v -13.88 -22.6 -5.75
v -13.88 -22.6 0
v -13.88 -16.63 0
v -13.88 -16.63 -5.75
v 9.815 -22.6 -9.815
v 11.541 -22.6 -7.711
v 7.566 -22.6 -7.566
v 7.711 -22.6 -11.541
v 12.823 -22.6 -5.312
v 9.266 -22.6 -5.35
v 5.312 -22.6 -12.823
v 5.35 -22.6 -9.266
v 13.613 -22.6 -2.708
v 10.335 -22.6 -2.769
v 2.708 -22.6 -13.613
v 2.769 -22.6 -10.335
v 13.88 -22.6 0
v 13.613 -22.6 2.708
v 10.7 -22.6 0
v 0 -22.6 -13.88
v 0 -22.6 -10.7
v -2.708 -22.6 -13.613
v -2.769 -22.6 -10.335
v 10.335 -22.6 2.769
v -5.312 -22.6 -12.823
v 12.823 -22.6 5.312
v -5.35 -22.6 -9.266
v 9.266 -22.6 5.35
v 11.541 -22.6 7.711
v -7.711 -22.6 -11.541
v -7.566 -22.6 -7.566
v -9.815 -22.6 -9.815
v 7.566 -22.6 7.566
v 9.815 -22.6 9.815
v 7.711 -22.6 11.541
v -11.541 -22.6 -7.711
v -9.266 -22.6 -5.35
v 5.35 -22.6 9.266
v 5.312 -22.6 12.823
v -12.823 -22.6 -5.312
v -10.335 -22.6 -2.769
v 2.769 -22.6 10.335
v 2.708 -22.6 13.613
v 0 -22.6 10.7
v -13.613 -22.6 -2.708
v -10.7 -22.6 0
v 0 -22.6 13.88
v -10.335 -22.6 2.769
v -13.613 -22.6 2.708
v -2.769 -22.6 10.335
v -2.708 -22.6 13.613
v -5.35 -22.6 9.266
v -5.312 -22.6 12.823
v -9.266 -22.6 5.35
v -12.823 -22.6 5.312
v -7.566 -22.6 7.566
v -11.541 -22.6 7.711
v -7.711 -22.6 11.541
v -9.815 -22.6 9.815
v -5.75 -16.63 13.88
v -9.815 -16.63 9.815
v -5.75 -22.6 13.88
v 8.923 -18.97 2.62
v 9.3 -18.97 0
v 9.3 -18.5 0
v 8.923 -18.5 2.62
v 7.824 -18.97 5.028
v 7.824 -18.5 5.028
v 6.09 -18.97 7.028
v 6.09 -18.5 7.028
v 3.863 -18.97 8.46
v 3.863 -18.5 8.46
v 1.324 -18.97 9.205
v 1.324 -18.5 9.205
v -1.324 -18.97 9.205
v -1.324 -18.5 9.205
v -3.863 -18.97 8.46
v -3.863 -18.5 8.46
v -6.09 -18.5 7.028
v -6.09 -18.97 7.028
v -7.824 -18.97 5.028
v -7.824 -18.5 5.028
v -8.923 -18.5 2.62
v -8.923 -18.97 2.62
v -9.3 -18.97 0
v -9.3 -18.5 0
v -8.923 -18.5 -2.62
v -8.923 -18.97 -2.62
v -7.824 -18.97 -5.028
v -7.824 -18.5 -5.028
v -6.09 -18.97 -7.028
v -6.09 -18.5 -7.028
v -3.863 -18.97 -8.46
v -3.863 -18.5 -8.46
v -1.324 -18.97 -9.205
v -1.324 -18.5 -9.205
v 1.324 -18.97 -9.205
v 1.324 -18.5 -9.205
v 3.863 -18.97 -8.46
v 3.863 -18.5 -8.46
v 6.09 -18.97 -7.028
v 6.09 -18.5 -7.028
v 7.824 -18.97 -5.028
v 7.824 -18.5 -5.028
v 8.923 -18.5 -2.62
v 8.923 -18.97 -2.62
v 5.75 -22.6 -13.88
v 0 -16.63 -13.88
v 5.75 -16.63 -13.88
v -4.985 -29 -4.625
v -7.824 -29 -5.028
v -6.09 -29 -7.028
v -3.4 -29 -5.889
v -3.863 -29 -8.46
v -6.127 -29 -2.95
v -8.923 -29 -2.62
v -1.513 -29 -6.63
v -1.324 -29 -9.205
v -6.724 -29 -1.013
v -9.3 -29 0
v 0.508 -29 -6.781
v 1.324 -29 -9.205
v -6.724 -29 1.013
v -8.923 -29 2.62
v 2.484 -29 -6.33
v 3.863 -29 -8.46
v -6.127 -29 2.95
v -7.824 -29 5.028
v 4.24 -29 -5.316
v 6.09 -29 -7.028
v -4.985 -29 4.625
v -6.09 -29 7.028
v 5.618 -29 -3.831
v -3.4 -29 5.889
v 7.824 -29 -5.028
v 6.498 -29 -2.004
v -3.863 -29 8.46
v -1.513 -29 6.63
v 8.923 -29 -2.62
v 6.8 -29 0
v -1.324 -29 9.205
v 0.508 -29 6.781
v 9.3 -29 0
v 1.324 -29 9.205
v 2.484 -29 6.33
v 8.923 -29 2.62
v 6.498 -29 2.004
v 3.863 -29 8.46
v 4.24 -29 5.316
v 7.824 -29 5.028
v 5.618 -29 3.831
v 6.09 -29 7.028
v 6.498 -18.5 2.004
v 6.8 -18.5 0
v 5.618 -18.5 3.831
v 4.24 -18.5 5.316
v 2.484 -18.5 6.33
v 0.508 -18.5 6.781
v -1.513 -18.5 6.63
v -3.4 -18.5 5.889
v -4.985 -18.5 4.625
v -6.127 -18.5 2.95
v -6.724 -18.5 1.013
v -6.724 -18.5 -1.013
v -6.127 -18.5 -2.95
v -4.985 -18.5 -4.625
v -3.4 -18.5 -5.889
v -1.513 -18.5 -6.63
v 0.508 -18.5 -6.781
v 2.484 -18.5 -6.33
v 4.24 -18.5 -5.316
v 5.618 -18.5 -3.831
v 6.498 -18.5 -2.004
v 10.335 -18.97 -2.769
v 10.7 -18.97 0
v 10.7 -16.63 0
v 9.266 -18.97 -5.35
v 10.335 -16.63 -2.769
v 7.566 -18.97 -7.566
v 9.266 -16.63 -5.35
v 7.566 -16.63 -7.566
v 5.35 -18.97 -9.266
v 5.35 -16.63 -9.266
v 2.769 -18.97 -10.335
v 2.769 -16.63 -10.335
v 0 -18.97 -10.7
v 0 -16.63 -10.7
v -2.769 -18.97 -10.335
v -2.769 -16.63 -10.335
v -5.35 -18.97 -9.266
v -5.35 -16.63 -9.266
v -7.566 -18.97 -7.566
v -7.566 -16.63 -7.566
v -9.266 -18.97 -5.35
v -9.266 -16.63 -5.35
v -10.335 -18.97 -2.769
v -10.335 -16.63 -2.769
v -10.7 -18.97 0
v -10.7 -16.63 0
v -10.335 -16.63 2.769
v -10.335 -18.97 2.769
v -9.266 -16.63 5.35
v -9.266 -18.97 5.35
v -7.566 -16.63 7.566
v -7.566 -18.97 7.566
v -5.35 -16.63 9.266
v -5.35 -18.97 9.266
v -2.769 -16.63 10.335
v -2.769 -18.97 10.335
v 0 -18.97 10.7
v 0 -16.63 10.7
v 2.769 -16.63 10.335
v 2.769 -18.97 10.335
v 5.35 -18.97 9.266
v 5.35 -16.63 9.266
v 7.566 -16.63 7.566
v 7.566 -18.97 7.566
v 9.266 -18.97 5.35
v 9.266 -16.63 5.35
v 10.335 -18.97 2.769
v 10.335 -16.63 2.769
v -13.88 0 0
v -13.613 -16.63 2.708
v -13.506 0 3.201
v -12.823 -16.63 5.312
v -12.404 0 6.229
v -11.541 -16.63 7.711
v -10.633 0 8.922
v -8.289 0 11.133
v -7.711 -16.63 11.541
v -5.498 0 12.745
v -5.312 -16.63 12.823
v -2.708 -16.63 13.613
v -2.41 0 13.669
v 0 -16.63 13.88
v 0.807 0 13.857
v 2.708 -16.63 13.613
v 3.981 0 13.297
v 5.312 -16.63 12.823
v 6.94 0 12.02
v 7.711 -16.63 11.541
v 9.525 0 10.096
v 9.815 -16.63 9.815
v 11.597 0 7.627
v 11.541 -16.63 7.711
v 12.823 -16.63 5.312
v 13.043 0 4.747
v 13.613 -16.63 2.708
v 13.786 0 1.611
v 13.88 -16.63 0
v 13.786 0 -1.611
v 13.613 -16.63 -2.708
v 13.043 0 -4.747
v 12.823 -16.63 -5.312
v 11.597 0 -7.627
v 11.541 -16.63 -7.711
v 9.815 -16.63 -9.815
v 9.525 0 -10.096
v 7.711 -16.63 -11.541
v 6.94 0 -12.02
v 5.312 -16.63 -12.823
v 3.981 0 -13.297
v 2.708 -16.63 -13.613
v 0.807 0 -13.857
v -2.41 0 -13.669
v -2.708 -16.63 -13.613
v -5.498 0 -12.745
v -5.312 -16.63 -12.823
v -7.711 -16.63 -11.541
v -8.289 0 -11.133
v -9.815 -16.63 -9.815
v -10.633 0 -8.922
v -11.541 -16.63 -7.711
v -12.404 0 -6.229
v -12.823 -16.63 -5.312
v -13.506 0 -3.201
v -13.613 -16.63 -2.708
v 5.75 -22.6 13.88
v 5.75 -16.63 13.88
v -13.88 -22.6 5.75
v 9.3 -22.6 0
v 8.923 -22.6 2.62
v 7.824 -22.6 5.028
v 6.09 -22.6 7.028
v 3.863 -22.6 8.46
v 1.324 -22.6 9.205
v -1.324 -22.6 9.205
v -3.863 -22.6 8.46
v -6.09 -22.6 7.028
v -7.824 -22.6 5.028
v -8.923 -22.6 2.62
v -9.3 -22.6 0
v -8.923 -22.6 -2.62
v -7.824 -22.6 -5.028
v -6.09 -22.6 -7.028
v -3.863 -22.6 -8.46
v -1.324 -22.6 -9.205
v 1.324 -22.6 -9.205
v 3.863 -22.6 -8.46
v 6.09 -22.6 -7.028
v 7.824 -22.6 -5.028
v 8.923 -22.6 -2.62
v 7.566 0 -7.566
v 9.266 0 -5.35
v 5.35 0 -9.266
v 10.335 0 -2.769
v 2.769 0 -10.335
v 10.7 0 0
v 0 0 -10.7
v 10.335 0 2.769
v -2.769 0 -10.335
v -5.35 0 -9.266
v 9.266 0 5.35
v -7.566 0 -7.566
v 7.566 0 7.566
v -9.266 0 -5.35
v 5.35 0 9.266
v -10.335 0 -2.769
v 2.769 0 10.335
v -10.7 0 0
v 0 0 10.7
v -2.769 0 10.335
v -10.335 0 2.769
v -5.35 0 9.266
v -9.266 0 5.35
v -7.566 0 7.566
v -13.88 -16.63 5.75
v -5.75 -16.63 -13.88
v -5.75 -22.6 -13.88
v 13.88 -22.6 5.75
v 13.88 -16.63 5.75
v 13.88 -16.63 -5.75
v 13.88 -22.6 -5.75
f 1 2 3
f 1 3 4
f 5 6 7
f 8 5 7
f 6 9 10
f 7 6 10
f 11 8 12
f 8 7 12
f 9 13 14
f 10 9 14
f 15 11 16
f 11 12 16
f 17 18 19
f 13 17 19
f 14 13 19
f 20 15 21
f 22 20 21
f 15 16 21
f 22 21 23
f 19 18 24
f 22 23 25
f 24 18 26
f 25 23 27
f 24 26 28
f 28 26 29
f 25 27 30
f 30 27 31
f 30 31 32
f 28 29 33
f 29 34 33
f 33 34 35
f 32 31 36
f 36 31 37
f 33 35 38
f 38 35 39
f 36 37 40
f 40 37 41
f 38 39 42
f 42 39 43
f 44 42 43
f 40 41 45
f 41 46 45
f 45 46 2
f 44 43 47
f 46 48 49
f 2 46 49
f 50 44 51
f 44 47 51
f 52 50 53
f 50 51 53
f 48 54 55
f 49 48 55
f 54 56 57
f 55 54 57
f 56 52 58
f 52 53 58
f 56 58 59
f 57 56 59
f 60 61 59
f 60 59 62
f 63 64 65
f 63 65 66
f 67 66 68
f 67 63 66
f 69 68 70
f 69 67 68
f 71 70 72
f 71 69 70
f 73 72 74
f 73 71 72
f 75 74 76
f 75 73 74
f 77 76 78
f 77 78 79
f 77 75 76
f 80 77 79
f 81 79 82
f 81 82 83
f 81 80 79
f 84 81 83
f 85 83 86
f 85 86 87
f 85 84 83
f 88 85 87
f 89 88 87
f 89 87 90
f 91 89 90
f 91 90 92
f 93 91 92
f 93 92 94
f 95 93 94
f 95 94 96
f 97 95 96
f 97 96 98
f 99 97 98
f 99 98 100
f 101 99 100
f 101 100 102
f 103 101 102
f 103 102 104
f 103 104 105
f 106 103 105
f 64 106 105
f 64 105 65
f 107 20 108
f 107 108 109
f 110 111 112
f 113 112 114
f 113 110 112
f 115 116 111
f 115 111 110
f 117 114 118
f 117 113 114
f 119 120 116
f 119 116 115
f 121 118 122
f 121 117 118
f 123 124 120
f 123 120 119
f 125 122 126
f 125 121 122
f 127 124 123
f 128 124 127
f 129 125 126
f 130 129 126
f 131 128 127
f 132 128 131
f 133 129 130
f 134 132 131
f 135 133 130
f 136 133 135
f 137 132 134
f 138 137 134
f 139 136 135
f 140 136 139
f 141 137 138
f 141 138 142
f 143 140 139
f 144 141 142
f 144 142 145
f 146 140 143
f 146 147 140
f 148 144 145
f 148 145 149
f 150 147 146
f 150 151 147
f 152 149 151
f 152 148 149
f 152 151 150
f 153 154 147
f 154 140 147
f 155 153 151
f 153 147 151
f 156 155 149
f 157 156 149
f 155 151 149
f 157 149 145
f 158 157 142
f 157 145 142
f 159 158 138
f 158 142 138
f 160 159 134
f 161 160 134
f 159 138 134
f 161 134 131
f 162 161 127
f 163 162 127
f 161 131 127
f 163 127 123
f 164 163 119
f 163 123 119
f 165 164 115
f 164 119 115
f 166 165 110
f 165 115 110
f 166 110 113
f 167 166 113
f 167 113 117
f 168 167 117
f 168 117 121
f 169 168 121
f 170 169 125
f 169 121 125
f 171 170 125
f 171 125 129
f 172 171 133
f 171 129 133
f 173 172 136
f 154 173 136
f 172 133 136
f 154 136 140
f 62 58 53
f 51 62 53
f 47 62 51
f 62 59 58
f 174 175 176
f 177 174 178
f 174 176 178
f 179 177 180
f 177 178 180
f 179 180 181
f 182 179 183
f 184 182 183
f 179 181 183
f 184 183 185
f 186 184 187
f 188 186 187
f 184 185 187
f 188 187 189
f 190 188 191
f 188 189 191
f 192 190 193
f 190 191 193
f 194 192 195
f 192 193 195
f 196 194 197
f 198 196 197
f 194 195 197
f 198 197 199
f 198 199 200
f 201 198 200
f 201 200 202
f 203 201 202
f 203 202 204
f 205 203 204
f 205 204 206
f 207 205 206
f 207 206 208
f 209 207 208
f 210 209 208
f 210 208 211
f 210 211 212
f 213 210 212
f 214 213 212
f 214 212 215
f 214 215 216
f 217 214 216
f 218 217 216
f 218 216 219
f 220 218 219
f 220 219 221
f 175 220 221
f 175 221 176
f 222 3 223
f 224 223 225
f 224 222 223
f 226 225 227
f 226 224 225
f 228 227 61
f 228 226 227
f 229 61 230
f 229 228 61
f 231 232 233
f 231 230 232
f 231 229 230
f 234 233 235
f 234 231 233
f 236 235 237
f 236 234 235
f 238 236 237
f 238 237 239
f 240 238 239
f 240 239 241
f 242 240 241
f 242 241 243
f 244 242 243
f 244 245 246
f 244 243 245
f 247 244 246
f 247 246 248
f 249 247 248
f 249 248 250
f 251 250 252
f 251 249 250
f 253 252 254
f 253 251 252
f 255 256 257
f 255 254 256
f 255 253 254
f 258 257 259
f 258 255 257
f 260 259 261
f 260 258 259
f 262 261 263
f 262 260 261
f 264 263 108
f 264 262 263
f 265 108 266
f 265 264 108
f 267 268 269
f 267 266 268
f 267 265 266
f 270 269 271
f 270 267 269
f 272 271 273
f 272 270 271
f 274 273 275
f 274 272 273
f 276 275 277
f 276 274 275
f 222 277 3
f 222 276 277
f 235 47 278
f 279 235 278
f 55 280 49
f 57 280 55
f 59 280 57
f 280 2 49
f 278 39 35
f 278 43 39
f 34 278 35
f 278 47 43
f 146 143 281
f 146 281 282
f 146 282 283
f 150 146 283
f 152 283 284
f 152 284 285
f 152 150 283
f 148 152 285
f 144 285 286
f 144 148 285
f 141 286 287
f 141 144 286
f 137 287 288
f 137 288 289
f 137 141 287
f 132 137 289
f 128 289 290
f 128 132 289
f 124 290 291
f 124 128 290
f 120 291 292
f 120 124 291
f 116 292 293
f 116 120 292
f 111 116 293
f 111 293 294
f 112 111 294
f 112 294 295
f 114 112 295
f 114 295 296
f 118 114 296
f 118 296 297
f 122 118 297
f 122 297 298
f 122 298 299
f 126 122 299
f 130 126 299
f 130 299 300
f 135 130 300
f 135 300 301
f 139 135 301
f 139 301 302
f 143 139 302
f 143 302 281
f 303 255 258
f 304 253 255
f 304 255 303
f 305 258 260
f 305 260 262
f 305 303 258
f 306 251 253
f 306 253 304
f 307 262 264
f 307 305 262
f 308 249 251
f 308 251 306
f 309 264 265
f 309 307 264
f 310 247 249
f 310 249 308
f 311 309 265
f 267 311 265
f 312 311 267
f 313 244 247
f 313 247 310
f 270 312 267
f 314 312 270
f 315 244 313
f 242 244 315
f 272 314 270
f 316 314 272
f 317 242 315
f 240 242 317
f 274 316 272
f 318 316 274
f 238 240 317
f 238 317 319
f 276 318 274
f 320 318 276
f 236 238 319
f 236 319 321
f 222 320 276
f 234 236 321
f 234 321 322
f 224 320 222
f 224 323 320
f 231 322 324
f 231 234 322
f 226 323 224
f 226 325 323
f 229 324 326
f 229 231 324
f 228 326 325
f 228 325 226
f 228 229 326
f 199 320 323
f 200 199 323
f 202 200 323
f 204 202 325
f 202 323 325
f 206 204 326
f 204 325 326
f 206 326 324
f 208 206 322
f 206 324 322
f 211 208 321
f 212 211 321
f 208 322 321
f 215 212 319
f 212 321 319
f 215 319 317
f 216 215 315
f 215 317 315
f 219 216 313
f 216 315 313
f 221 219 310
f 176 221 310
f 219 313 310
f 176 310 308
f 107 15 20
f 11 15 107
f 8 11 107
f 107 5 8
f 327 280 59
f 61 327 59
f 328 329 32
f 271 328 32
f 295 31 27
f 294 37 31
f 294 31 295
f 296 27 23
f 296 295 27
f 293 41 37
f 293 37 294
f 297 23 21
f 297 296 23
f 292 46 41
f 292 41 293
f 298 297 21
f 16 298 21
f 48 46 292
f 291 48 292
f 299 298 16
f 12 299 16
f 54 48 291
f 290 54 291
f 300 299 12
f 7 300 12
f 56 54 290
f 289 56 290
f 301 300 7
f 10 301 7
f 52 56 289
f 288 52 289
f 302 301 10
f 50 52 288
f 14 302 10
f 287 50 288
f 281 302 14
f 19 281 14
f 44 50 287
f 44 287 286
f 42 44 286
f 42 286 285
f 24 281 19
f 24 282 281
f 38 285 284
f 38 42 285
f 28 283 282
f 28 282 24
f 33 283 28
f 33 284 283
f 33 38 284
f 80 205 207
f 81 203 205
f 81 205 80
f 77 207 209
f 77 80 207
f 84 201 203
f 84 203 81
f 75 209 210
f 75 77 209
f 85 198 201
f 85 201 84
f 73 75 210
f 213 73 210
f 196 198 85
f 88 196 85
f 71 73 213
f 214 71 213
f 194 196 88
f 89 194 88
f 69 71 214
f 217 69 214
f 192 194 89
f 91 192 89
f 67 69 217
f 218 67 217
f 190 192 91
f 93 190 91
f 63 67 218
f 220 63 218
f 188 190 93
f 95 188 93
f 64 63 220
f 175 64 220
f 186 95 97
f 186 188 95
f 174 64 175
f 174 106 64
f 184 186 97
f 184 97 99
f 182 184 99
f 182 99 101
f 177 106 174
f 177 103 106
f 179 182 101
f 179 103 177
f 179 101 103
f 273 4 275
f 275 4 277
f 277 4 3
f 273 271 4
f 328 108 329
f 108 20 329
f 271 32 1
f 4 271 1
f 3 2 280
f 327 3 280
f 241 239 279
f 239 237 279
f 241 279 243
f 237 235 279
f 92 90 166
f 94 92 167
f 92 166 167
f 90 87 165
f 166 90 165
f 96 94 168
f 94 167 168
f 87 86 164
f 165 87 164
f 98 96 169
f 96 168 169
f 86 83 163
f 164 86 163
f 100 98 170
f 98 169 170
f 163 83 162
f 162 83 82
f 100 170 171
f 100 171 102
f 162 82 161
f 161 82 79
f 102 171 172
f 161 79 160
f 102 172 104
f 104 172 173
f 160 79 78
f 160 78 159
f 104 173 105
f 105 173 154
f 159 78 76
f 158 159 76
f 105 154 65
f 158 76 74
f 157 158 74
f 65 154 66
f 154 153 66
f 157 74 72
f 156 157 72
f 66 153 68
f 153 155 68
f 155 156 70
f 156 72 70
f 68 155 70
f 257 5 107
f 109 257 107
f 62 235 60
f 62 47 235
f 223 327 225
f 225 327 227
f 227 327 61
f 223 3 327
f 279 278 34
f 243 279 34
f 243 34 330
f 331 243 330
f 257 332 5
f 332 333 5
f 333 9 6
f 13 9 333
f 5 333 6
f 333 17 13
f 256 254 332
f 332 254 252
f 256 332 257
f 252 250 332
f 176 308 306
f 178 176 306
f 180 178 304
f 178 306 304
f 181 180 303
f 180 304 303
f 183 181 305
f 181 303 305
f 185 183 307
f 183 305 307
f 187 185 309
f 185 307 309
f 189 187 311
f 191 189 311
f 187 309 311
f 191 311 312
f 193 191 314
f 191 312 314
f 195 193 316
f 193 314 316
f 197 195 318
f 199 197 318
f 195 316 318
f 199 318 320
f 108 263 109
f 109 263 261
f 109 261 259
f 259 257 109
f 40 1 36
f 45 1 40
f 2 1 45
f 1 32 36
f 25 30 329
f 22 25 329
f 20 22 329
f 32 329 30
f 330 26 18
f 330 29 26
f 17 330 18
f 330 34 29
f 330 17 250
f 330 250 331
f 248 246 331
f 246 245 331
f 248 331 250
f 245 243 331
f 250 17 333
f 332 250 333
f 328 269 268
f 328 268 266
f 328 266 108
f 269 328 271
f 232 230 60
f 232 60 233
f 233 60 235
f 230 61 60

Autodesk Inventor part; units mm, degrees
ref_plane "YZ Plane" through (0, 0, 0) normal (1, 0, 0) x (0, 1, 0)
ref_plane "XZ Plane" through (0, 0, 0) normal (0, 1, 0) x (-1, 0, 0)
sketch "Boceto1" plane through (0, 0, 0) normal (0, 1, 0) x (-1, 0, 0)
  circle A0 centre (0, 0) radius 10.7
  circle A1 centre (0, 0) radius 13.88
  dimension "d0" = 21.4
  dimension "d1" = 27.76
extrude "Extrusión1" add sketch "Boceto1" against normal blind 22.6
sketch "Boceto2" plane through (0, -22.6, 0) normal (0, -1, 0) x (1, 0, 0)
  circle A0 centre (0, 0) radius 13.88 projected
  line L0 (0, -13.88) -> (-5.75, -13.88)
  line L1 (0, -13.88) -> (5.75, -13.88)
  line L2 (13.88, 0) -> (13.88, -5.75)
  line L3 (13.88, 0) -> (13.88, 5.75)
  line L4 (0, 13.88) -> (5.75, 13.88)
  line L5 (0, 13.88) -> (-5.75, 13.88)
  line L6 (-13.88, 0) -> (-13.88, -5.75)
  line L7 (-13.88, 0) -> (-13.88, 5.75)
  line L8 (-13.88, 5.75) -> (-5.75, 13.88)
  line L9 (5.75, 13.88) -> (13.88, 5.75)
  line L10 (13.88, -5.75) -> (5.75, -13.88)
  line L11 (-5.75, -13.88) -> (-13.88, -5.75)
  dimension "d5" = 5.75
  dimension "d6" = 5.75
  dimension "d7" = 5.75
  dimension "d8" = 5.75
  dimension "d9" = 5.75
  dimension "d10" = 5.75
  dimension "d11" = 5.75
  dimension "d12" = 5.75
extrude "Extrusión2" add sketch "Boceto2" against normal blind 5.97
ref_plane "Plano de trabajo2" through (0, -18.5, 0) normal (0, 1, 0) x (1, 0, 0)
sketch "Boceto4" plane through (0, -18.5, 0) normal (0, 1, 0) x (1, 0, 0)
  circle A0 centre (0, 0) radius 6.8
  dimension "d18" = 13.6
extrude "Extrusión4" add sketch "Boceto4" against normal blind 18.97
sketch "Boceto5" plane through (0, 0, 0) normal (0, 1, 0) x (1, 0, 0)
  circle A0 centre (0, 0) radius 10.7
extrude "Extrusión5" cut sketch "Boceto5" against normal blind 18.97
sketch "Boceto6" plane through (0, -37.47, 0) normal (0, -1, 0) x (1, 0, 0)
  circle A0 centre (0, 0) radius 6.7
  circle A1 centre (0, 0) radius 9.3
  dimension "d25" = 13.4
  dimension "d26" = 18.6
extrude "Extrusión6" add sketch "Boceto6" against normal blind 18.97
sketch "Boceto7" plane through (0, -37.47, 0) normal (0, -1, 0) x (1, 0, 0)
  circle A0 centre (0, 0) radius 6.8
  dimension "d29" = 13.6
extrude "Extrusión7" cut sketch "Boceto7" against normal blind 18.97
thread "Rosca2" size "M20x2.5" class "6g" standard "ANSI Metric M Profile" full length
sketch "Boceto9" plane through (0, -37.47, 0) normal (0, -1, 0) x (1, 0, 0)
  circle A0 centre (0, 0) radius 9.3
extrude "Extrusión8" cut sketch "Boceto9" against normal blind 8.47
properties part number "ACOPLE2"
